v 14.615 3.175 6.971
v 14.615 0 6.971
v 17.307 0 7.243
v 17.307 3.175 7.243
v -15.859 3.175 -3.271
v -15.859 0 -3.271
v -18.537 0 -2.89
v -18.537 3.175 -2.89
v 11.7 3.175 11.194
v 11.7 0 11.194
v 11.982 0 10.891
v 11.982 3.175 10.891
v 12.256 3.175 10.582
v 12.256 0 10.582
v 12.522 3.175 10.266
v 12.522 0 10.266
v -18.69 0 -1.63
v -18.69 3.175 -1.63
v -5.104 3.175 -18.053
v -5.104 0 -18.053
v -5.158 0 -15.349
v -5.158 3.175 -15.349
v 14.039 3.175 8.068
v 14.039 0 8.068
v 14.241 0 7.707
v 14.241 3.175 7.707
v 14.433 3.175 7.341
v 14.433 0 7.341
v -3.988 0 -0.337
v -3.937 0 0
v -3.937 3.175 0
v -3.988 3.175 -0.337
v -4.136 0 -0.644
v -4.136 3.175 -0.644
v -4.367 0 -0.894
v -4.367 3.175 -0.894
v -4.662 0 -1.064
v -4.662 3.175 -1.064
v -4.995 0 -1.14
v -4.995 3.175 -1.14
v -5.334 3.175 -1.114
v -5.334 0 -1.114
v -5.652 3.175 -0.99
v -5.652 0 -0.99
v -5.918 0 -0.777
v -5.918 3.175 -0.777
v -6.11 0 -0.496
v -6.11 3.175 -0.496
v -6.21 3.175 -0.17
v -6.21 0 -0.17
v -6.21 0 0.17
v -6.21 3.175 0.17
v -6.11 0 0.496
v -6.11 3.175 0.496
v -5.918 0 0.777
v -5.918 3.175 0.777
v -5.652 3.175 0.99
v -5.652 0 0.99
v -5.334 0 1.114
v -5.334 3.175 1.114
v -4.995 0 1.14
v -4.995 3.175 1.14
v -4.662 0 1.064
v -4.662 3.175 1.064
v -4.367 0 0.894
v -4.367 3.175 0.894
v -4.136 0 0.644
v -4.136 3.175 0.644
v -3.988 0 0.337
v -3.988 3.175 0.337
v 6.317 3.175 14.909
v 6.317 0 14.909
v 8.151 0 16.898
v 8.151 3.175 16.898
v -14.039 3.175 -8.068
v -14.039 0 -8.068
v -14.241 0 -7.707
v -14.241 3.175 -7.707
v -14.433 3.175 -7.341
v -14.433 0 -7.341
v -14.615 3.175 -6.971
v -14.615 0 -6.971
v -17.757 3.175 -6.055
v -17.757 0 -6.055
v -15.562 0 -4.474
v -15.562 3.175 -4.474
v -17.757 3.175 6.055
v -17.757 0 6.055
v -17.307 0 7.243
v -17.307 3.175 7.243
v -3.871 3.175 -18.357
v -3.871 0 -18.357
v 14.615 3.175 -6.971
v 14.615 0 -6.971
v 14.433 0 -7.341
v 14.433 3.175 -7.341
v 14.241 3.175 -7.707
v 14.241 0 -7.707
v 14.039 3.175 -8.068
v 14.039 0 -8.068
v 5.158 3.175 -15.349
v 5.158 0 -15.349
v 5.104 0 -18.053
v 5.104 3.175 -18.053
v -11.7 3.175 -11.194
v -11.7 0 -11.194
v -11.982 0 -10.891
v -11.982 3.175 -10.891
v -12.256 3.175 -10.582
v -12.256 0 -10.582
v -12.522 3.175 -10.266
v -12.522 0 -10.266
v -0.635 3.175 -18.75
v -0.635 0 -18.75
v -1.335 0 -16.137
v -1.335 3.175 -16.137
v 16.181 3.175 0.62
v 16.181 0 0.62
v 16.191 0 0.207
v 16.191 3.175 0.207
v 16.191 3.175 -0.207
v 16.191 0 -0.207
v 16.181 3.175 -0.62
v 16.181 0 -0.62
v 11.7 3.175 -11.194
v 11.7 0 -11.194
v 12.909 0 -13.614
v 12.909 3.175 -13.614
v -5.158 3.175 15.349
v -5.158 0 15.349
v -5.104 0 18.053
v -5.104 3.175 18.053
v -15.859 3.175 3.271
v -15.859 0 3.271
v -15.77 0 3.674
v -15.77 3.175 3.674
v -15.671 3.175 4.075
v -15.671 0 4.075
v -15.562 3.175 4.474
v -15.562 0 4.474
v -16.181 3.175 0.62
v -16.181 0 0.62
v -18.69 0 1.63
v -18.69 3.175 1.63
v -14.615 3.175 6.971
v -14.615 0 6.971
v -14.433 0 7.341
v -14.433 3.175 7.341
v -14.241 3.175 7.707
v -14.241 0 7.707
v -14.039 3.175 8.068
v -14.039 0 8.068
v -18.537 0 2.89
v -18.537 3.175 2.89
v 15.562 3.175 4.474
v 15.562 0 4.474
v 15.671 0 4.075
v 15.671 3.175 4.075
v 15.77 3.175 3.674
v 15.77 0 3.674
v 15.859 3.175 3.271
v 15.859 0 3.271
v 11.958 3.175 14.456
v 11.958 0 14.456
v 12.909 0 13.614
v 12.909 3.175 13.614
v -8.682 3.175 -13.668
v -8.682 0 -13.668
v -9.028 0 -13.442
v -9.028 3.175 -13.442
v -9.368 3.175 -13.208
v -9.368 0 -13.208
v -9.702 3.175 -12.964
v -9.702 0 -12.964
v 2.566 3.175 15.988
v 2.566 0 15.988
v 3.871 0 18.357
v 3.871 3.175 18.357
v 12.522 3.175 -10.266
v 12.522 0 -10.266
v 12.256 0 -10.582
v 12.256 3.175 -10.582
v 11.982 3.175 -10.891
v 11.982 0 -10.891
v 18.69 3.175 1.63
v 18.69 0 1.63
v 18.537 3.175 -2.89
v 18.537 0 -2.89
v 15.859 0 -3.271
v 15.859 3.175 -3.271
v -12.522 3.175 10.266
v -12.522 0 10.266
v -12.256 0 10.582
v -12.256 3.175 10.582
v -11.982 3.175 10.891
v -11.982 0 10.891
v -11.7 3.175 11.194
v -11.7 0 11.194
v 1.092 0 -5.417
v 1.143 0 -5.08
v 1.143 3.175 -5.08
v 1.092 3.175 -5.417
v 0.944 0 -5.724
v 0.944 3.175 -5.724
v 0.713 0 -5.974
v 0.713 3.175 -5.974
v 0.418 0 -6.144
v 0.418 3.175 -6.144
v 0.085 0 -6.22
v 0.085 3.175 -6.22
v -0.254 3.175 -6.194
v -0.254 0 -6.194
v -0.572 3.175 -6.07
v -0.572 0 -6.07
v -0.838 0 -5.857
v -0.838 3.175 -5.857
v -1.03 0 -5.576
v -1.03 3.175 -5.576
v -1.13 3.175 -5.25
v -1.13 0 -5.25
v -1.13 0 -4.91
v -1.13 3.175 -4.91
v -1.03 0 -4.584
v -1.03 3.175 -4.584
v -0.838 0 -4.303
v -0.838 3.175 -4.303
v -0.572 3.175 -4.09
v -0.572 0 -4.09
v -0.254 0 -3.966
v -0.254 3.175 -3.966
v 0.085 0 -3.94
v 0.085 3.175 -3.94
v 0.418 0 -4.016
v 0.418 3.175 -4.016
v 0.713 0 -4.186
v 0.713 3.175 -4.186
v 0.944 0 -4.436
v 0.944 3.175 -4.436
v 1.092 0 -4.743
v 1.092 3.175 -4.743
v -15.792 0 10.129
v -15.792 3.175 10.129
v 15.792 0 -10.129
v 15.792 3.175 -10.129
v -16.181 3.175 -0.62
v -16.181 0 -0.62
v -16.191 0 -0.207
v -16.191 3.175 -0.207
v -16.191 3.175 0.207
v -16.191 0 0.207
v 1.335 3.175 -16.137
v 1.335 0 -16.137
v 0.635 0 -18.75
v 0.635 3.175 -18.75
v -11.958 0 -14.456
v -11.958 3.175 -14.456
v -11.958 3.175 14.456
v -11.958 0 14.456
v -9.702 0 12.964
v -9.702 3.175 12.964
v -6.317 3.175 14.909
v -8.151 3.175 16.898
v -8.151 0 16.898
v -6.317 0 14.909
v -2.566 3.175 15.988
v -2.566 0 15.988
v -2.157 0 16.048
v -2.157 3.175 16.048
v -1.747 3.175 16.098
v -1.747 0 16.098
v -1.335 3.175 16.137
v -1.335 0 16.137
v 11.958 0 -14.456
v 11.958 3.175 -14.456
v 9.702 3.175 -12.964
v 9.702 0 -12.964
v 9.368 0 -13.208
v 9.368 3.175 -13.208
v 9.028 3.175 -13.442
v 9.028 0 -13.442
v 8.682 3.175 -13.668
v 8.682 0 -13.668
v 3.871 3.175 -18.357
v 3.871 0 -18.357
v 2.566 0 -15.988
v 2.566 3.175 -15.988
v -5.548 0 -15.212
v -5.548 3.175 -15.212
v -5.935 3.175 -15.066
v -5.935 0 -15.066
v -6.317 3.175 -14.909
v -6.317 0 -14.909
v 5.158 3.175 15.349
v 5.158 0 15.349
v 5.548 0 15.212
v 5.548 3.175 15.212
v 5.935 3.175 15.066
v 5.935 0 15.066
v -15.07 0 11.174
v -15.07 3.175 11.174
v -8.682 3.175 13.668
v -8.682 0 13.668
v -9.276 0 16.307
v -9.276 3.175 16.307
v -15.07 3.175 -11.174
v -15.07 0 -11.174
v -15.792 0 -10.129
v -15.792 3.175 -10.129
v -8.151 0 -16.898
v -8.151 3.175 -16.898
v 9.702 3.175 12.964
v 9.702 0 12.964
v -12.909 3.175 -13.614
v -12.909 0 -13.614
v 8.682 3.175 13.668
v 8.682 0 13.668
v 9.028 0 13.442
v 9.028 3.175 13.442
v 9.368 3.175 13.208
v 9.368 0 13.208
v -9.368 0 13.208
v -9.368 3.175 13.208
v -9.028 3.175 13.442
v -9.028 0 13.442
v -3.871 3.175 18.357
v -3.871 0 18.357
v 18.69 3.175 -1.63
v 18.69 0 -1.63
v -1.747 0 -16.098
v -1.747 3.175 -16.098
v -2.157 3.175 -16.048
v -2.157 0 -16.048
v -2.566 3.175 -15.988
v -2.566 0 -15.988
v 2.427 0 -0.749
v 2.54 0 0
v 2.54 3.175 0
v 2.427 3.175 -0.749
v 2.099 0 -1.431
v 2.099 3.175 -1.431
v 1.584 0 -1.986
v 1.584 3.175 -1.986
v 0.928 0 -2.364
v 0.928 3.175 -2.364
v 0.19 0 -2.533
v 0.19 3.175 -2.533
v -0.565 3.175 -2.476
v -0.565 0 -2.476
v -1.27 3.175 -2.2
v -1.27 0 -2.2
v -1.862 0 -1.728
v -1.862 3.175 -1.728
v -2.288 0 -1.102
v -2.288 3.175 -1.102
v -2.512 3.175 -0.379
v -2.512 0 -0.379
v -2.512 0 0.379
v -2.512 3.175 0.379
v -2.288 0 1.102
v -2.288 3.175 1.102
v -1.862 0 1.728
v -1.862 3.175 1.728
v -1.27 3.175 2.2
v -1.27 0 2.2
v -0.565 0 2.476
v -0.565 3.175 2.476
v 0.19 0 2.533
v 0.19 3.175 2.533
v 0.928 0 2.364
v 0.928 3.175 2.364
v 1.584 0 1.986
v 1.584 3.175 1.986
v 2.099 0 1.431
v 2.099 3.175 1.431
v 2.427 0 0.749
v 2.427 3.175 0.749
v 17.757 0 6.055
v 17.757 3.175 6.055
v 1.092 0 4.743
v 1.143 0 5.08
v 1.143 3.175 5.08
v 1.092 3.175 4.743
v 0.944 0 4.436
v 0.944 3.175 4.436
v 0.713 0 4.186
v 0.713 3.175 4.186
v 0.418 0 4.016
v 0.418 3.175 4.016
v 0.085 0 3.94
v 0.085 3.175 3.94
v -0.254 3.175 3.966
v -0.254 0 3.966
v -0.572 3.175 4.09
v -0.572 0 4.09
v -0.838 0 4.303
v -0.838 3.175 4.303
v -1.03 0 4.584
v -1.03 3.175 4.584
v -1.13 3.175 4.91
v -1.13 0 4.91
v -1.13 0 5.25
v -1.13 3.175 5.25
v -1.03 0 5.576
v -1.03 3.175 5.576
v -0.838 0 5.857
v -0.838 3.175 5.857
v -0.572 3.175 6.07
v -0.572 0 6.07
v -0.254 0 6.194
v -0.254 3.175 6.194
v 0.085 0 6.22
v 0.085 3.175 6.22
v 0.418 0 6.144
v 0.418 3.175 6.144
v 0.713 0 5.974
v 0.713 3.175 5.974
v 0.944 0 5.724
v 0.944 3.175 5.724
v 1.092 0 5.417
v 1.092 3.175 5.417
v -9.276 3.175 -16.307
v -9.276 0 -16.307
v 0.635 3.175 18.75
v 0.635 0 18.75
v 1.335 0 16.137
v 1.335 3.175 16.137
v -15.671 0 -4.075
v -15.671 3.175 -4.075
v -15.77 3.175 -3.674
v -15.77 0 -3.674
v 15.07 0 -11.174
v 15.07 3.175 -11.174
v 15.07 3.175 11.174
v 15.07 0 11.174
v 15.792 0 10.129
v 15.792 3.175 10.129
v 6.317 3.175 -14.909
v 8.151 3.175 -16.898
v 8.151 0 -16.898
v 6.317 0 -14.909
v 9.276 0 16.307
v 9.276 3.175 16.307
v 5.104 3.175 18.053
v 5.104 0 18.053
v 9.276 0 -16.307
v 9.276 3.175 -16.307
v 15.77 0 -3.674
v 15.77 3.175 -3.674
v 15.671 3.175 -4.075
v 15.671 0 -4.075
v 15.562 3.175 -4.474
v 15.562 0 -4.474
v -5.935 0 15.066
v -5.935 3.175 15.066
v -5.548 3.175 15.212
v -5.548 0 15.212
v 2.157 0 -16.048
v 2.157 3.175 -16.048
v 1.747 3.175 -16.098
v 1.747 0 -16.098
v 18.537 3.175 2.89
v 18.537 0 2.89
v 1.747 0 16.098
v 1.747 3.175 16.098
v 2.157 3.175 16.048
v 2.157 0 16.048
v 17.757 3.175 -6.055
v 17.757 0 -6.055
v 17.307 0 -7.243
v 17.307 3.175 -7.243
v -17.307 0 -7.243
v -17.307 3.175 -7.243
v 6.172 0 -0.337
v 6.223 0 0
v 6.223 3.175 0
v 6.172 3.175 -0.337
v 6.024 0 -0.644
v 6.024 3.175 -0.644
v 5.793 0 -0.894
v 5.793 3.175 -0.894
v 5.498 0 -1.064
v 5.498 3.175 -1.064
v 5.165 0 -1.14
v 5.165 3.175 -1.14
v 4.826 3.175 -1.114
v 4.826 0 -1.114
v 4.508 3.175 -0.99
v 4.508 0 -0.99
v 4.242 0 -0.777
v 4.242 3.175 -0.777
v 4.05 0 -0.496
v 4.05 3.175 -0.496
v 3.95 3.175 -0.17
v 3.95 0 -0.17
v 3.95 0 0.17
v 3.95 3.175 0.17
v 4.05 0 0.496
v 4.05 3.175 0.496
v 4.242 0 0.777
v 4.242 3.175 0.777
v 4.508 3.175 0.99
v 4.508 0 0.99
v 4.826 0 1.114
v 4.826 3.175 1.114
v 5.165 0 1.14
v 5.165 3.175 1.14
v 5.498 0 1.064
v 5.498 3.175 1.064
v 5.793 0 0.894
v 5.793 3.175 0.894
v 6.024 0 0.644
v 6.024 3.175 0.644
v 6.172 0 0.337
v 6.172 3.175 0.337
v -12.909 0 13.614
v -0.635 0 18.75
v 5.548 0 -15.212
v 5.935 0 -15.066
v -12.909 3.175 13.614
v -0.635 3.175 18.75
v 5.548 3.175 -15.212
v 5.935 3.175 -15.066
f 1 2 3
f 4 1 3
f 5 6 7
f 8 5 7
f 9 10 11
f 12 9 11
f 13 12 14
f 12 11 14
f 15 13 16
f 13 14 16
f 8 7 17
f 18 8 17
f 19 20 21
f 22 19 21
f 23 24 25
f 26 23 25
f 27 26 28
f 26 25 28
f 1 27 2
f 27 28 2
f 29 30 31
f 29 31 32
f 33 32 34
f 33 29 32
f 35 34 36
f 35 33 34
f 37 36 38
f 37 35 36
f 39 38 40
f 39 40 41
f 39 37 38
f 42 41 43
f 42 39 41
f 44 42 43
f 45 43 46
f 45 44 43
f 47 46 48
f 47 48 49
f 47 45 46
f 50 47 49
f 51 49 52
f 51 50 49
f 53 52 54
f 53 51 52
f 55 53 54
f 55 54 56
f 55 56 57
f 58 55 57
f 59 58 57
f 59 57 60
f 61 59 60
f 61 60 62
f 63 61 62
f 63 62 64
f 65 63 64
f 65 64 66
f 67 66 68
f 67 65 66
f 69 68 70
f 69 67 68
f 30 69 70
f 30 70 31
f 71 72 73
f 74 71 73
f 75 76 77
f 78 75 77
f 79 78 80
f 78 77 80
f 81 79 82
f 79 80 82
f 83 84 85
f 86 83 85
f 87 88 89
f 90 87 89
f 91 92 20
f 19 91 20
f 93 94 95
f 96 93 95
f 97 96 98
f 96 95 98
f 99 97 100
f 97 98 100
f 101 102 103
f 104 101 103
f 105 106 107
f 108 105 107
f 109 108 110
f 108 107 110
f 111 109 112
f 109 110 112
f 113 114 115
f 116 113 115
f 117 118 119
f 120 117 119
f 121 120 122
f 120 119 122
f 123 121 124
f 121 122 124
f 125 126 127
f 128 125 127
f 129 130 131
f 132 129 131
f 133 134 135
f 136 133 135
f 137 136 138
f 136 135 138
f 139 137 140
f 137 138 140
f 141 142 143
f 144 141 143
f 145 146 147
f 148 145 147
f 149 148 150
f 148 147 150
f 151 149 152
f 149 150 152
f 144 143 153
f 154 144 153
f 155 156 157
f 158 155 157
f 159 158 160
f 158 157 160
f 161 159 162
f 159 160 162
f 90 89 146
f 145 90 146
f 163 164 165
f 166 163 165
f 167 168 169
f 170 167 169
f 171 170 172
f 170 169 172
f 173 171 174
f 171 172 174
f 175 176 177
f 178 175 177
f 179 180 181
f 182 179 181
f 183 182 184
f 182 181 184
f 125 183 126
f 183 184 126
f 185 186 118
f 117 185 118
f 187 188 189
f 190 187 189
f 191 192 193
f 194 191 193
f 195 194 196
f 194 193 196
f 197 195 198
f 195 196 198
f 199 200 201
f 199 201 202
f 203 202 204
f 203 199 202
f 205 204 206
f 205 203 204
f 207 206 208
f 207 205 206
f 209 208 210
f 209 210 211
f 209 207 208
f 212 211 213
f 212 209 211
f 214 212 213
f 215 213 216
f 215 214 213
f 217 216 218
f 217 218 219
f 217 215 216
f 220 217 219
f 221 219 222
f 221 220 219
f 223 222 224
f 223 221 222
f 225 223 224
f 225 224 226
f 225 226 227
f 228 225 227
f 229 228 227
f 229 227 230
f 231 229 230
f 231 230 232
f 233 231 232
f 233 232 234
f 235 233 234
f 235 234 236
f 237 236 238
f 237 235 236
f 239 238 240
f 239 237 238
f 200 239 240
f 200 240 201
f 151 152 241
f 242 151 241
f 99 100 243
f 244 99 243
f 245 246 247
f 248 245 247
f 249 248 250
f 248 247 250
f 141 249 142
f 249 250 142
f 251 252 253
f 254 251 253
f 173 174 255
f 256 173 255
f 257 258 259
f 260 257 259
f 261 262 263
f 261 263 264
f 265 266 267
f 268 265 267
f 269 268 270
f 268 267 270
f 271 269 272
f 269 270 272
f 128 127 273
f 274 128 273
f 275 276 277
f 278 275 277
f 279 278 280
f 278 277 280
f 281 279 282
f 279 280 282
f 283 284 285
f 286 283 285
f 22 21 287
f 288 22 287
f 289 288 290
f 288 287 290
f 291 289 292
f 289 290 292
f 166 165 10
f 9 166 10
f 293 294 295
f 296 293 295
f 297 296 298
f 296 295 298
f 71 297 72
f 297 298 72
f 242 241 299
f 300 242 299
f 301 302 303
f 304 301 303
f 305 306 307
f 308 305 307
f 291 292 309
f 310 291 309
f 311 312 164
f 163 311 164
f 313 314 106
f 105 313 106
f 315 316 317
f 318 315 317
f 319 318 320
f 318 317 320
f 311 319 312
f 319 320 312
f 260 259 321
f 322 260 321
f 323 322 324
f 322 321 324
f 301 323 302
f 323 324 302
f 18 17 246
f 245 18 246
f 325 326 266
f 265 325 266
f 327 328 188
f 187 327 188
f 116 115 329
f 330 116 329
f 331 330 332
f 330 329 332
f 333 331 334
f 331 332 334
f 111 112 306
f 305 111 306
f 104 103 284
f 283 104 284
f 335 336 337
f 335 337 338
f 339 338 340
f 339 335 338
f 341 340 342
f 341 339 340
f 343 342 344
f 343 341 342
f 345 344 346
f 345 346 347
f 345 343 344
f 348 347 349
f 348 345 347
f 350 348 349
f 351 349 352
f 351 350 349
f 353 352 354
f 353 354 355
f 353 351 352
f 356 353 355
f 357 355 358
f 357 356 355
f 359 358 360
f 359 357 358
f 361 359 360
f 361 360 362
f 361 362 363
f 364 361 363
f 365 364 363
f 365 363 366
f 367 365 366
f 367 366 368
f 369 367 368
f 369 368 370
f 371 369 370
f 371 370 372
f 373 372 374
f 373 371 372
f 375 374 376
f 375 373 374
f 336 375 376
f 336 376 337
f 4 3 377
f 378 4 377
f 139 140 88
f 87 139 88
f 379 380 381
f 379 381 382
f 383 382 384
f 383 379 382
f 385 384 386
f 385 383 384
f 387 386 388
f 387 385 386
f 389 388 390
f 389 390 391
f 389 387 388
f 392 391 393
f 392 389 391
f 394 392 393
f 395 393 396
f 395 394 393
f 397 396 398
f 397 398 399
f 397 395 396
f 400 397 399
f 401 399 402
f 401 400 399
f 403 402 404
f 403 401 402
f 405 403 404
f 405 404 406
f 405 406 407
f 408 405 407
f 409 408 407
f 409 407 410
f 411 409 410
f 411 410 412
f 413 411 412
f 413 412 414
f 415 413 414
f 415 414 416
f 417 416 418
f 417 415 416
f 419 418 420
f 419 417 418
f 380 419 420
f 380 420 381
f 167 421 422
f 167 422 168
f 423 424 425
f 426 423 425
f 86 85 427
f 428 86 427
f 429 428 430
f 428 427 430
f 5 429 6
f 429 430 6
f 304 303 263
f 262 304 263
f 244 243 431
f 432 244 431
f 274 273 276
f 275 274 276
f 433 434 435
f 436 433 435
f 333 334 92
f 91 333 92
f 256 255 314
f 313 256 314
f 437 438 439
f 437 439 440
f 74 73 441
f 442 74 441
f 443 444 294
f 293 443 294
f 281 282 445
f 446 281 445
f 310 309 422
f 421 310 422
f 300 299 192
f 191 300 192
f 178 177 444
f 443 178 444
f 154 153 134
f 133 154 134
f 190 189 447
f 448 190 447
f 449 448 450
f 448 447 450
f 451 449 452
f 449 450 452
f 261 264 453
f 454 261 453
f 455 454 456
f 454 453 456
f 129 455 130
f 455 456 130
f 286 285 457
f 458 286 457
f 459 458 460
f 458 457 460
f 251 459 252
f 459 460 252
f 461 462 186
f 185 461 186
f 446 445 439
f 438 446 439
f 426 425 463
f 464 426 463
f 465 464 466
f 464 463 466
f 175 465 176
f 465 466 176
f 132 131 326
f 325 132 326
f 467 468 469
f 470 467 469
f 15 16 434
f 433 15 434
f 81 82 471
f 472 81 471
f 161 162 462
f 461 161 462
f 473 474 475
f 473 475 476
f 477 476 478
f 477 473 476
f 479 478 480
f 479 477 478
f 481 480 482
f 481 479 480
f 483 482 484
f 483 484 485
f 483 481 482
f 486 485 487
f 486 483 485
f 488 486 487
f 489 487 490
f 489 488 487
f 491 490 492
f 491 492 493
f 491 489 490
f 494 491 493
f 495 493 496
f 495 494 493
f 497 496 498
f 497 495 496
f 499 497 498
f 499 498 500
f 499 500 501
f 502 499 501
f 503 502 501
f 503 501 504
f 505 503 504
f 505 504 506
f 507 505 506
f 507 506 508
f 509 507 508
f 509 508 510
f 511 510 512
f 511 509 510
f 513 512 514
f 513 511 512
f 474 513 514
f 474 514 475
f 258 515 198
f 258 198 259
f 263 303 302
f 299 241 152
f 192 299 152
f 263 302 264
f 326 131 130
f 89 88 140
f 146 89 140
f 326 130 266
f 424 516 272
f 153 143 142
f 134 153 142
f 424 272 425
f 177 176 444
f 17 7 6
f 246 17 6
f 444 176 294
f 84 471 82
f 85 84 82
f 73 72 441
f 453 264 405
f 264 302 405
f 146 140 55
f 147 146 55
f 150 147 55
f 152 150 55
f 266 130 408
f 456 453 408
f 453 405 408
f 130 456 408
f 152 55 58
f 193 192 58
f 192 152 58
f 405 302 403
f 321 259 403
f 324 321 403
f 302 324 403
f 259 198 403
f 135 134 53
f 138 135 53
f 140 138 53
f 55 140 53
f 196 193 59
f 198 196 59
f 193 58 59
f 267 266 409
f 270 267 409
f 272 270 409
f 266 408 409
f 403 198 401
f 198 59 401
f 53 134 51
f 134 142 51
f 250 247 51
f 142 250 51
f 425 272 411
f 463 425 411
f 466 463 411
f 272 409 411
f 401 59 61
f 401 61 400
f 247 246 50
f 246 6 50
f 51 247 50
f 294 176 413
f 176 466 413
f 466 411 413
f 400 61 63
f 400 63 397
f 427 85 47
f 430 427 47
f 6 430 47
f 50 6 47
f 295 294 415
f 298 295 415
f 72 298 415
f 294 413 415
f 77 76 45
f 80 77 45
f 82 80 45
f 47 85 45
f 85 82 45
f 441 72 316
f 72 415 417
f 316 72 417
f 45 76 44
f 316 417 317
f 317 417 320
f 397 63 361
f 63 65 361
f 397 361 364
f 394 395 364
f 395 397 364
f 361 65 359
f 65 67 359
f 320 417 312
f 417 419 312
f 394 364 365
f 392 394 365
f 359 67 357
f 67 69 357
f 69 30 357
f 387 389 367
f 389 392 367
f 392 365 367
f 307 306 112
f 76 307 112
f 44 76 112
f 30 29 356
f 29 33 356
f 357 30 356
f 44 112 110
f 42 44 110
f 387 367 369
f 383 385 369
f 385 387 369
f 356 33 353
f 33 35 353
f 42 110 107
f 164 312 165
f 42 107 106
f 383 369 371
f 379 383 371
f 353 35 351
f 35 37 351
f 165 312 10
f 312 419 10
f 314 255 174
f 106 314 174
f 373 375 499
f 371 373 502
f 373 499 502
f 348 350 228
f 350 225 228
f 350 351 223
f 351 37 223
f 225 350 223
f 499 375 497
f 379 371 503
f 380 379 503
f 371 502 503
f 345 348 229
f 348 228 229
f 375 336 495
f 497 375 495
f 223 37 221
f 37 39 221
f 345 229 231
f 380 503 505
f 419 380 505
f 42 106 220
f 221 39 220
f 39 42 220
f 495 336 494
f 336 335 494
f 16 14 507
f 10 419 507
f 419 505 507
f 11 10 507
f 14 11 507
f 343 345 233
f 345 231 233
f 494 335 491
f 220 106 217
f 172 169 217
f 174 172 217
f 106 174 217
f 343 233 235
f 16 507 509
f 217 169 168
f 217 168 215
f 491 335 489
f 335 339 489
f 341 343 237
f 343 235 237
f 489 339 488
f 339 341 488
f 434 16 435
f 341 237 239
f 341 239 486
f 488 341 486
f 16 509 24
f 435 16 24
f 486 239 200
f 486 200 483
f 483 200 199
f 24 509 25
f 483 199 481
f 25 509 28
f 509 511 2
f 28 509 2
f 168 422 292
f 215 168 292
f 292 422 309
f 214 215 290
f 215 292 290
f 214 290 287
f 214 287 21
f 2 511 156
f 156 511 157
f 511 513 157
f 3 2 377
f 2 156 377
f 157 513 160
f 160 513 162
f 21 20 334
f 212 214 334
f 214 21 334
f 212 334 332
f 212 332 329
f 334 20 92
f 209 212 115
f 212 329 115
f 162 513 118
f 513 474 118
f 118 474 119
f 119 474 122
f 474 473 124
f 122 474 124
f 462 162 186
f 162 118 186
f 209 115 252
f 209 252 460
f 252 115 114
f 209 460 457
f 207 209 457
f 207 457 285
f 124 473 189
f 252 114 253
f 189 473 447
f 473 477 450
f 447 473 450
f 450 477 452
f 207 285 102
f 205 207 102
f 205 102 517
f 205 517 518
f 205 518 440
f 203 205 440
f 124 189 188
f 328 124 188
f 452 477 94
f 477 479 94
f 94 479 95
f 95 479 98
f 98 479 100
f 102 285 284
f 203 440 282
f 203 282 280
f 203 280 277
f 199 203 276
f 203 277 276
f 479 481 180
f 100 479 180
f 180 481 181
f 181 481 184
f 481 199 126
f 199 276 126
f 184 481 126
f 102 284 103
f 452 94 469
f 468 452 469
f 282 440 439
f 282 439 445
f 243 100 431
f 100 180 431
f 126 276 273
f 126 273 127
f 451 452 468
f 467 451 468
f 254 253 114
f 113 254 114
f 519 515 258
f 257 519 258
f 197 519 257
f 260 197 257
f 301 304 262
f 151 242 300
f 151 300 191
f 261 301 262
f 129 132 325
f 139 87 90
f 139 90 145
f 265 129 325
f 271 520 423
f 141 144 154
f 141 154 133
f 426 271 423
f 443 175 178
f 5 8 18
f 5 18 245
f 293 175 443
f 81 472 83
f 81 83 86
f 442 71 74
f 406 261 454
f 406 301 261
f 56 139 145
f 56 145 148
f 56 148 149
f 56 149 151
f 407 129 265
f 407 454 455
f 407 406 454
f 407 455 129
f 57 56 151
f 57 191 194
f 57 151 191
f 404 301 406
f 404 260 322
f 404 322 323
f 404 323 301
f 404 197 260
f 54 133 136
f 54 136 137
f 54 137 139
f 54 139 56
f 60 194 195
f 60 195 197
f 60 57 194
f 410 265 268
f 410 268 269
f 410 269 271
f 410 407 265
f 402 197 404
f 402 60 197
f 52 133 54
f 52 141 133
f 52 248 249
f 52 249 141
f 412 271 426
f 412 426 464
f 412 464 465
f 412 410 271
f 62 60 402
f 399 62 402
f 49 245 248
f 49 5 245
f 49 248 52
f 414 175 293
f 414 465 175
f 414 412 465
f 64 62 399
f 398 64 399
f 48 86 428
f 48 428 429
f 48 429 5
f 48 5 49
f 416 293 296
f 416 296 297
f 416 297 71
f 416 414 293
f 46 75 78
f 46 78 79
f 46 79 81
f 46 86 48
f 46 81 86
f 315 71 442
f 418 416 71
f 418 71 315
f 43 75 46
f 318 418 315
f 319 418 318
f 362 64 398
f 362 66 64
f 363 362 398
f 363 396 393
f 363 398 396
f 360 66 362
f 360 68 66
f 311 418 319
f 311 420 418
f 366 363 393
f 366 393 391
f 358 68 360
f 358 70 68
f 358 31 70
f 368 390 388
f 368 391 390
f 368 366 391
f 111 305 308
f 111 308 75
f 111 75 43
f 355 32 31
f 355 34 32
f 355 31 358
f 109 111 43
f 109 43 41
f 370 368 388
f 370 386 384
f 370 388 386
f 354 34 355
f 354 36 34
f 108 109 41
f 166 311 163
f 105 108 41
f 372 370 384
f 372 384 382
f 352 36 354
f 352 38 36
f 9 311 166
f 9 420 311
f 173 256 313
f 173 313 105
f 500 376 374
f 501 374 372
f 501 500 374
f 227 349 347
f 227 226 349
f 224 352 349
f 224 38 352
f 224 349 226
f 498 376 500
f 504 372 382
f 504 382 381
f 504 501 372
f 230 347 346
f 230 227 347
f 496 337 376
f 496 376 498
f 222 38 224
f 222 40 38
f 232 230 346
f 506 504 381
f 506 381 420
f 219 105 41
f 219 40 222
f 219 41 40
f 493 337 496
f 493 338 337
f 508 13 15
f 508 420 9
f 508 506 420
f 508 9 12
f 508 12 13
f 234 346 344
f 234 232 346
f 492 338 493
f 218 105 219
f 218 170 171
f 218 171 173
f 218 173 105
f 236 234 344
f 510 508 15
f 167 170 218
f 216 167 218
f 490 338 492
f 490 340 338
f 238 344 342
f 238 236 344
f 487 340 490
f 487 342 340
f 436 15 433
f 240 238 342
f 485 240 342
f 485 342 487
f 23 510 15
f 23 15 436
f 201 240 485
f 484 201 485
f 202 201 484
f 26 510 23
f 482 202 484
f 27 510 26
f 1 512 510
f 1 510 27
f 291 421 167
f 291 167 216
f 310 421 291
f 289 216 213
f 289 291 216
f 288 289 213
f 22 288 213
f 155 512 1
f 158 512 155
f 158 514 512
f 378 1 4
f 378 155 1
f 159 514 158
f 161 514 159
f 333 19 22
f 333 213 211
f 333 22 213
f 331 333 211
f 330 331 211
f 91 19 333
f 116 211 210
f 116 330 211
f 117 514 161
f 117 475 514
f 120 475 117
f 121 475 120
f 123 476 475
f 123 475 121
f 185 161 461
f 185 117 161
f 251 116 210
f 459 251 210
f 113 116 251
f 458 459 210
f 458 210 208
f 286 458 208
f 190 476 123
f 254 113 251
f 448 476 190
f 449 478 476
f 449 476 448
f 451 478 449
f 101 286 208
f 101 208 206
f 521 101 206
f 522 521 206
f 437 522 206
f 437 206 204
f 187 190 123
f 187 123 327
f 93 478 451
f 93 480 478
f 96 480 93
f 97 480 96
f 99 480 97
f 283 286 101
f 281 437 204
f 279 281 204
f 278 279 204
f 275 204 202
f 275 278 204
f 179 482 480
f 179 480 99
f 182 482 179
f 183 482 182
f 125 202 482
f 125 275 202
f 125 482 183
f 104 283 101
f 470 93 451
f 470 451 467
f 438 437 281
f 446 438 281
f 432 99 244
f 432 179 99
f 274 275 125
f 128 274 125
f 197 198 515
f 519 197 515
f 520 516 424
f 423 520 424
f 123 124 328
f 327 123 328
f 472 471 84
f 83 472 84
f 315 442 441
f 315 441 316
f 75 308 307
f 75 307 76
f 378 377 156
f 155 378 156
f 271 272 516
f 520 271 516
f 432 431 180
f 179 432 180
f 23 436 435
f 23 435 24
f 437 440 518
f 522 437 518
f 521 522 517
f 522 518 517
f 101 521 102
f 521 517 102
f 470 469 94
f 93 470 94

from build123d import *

# Parameters (mm, degrees)
BOSS_EXTRUDE1_DEPTH = 3.175
SKETCH2_R           = 1.143
SKETCH2_R_2         = 2.54
CUT_EXTRUDE1_DEPTH  = 3.175


with BuildPart() as part:
    # Sketch1 → Boss-Extrude1 (new body)
    with BuildSketch(Plane(origin=(0, 0, 0), x_dir=(1, 0, 0), z_dir=(0, 1, 0))):
        with BuildLine():
            Line((0.635, 18.750209072), (-0.635, 18.750209114))
            Line((-0.635, 18.750209114), (-1.33510965, 16.137364669))
            ThreePointArc((-1.33510965, 16.137364669), (-1.951790294, 16.074438432), (-2.565610552, 15.987954802))
            Line((-2.565610552, 15.987954802), (-3.870670686, 18.357327521))
            Line((-3.870670686, 18.357327521), (-5.103766804, 18.053396667))
            Line((-5.103766804, 18.053396667), (-5.158237936, 15.348929528))
            ThreePointArc((-5.158237936, 15.348929528), (-5.741939727, 15.140250474), (-6.317226596, 14.909383099))
            Line((-6.317226596, 14.909383099), (-8.15139206, 16.897584819))
            Line((-8.15139206, 16.897584819), (-9.275921232, 16.307386428))
            Line((-9.275921232, 16.307386428), (-8.681588182, 13.668470393))
            ThreePointArc((-8.681588182, 13.668470393), (-9.198388493, 13.326166192), (-9.701708393, 12.964332243))
            Line((-9.701708393, 12.964332243), (-11.958384157, 14.455815909))
            Line((-11.958384157, 14.455815909), (-12.908992835, 13.613650164))
            Line((-12.908992835, 13.613650164), (-11.70039608, 11.193649442))
            ThreePointArc((-11.70039608, 11.193649442), (-12.120260356, 10.737613569), (-12.522362162, 10.265841521))
            Line((-12.522362162, 10.265841521), (-15.070398434, 11.173927523))
            Line((-15.070398434, 11.173927523), (-15.791840697, 10.128738036))
            Line((-15.791840697, 10.128738036), (-14.039219486, 8.068294272))
            ThreePointArc((-14.039219486, 8.068294272), (-14.337746742, 7.525029875), (-14.615261759, 6.970737405))
            Line((-14.615261759, 6.970737405), (-17.306575933, 7.242651084))
            Line((-17.306575933, 7.242651084), (-17.756924178, 6.055180471))
            Line((-17.756924178, 6.055180471), (-15.562134487, 4.474039167))
            ThreePointArc((-15.562134487, 4.474039167), (-15.721975403, 3.875118797), (-15.858775467, 3.270519368))
            Line((-15.858775467, 3.270519368), (-18.536958145, 2.890458091))
            Line((-18.536958145, 2.890458091), (-18.69003977, 1.629717826))
            Line((-18.69003977, 1.629717826), (-16.180634797, 0.619769168))
            ThreePointArc((-16.180634797, 0.619769168), (-16.1925, -1e-07), (-16.180634789, -0.619769367))
            Line((-16.180634789, -0.619769367), (-18.690039729, -1.629717821))
            Line((-18.690039729, -1.629717821), (-18.536958186, -2.890458096))
            Line((-18.536958186, -2.890458096), (-15.858775427, -3.270519563))
            ThreePointArc((-15.858775427, -3.270519563), (-15.721975355, -3.875118991), (-15.562134432, -4.474039358))
            Line((-15.562134432, -4.474039358), (-17.75692414, -6.055180456))
            Line((-17.75692414, -6.055180456), (-17.306575972, -7.242651099))
            Line((-17.306575972, -7.242651099), (-14.615261673, -6.970737585))
            ThreePointArc((-14.615261673, -6.970737585), (-14.337746649, -7.525030051), (-14.039219387, -8.068294445))
            Line((-14.039219387, -8.068294445), (-15.791840663, -10.128738013))
            Line((-15.791840663, -10.128738013), (-15.070398469, -11.173927546))
            Line((-15.070398469, -11.173927546), (-12.522362036, -10.265841675))
            ThreePointArc((-12.522362036, -10.265841675), (-12.120260224, -10.737613718), (-11.700395942, -11.193649586))
            Line((-11.700395942, -11.193649586), (-12.908992808, -13.613650133))
            Line((-12.908992808, -13.613650133), (-11.958384185, -14.45581594))
            Line((-11.958384185, -14.45581594), (-9.701708233, -12.964332363))
            ThreePointArc((-9.701708233, -12.964332363), (-9.198388329, -13.326166305), (-8.681588014, -13.6684705))
            Line((-8.681588014, -13.6684705), (-9.275921213, -16.307386391))
            Line((-9.275921213, -16.307386391), (-8.15139208, -16.897584856))
            Line((-8.15139208, -16.897584856), (-6.317226413, -14.909383176))
            ThreePointArc((-6.317226413, -14.909383176), (-5.74193954, -15.140250545), (-5.158237747, -15.348929591))
            Line((-5.158237747, -15.348929591), (-5.103766794, -18.053396627))
            Line((-5.103766794, -18.053396627), (-3.870670696, -18.357327561))
            Line((-3.870670696, -18.357327561), (-2.565610355, -15.987954833))
            ThreePointArc((-2.565610355, -15.987954833), (-1.951790096, -16.074438456), (-1.335109452, -16.137364686))
            Line((-1.335109452, -16.137364686), (-0.635, -18.750209072))
            Line((-0.635, -18.750209072), (0.635, -18.750209114))
            Line((0.635, -18.750209114), (1.33510965, -16.137364669))
            ThreePointArc((1.33510965, -16.137364669), (1.951790294, -16.074438432), (2.565610552, -15.987954802))
            Line((2.565610552, -15.987954802), (3.870670686, -18.357327521))
            Line((3.870670686, -18.357327521), (5.103766804, -18.053396667))
            Line((5.103766804, -18.053396667), (5.158237936, -15.348929528))
            ThreePointArc((5.158237936, -15.348929528), (5.741939727, -15.140250474), (6.317226596, -14.909383099))
            Line((6.317226596, -14.909383099), (8.15139206, -16.897584819))
            Line((8.15139206, -16.897584819), (9.275921232, -16.307386428))
            Line((9.275921232, -16.307386428), (8.681588182, -13.668470393))
            ThreePointArc((8.681588182, -13.668470393), (9.198388493, -13.326166192), (9.701708393, -12.964332243))
            Line((9.701708393, -12.964332243), (11.958384157, -14.455815909))
            Line((11.958384157, -14.455815909), (12.908992835, -13.613650164))
            Line((12.908992835, -13.613650164), (11.70039608, -11.193649442))
            ThreePointArc((11.70039608, -11.193649442), (12.120260356, -10.737613569), (12.522362162, -10.265841521))
            Line((12.522362162, -10.265841521), (15.070398434, -11.173927523))
            Line((15.070398434, -11.173927523), (15.791840697, -10.128738036))
            Line((15.791840697, -10.128738036), (14.039219486, -8.068294272))
            ThreePointArc((14.039219486, -8.068294272), (14.337746742, -7.525029875), (14.615261759, -6.970737405))
            Line((14.615261759, -6.970737405), (17.306575933, -7.242651084))
            Line((17.306575933, -7.242651084), (17.756924178, -6.055180471))
            Line((17.756924178, -6.055180471), (15.562134487, -4.474039167))
            ThreePointArc((15.562134487, -4.474039167), (15.721975403, -3.875118797), (15.858775467, -3.270519368))
            Line((15.858775467, -3.270519368), (18.536958145, -2.890458091))
            Line((18.536958145, -2.890458091), (18.69003977, -1.629717826))
            Line((18.69003977, -1.629717826), (16.180634797, -0.619769168))
            ThreePointArc((16.180634797, -0.619769168), (16.1925, 1e-07), (16.180634789, 0.619769367))
            Line((16.180634789, 0.619769367), (18.690039729, 1.629717821))
            Line((18.690039729, 1.629717821), (18.536958186, 2.890458096))
            Line((18.536958186, 2.890458096), (15.858775427, 3.270519563))
            ThreePointArc((15.858775427, 3.270519563), (15.721975355, 3.875118991), (15.562134432, 4.474039358))
            Line((15.562134432, 4.474039358), (17.75692414, 6.055180456))
            Line((17.75692414, 6.055180456), (17.306575972, 7.242651099))
            Line((17.306575972, 7.242651099), (14.615261673, 6.970737585))
            ThreePointArc((14.615261673, 6.970737585), (14.337746649, 7.525030051), (14.039219387, 8.068294445))
            Line((14.039219387, 8.068294445), (15.791840663, 10.128738013))
            Line((15.791840663, 10.128738013), (15.070398469, 11.173927546))
            Line((15.070398469, 11.173927546), (12.522362036, 10.265841675))
            ThreePointArc((12.522362036, 10.265841675), (12.120260224, 10.737613718), (11.700395942, 11.193649586))
            Line((11.700395942, 11.193649586), (12.908992808, 13.613650133))
            Line((12.908992808, 13.613650133), (11.958384185, 14.45581594))
            Line((11.958384185, 14.45581594), (9.701708233, 12.964332363))
            ThreePointArc((9.701708233, 12.964332363), (9.198388329, 13.326166305), (8.681588014, 13.6684705))
            Line((8.681588014, 13.6684705), (9.275921213, 16.307386391))
            Line((9.275921213, 16.307386391), (8.15139208, 16.897584856))
            Line((8.15139208, 16.897584856), (6.317226413, 14.909383176))
            ThreePointArc((6.317226413, 14.909383176), (5.74193954, 15.140250545), (5.158237747, 15.348929591))
            Line((5.158237747, 15.348929591), (5.103766794, 18.053396627))
            Line((5.103766794, 18.053396627), (3.870670696, 18.357327561))
            Line((3.870670696, 18.357327561), (2.565610355, 15.987954833))
            ThreePointArc((2.565610355, 15.987954833), (1.951790096, 16.074438456), (1.335109452, 16.137364686))
            Line((1.335109452, 16.137364686), (0.635, 18.750209072))
        make_face()
    extrude(amount=BOSS_EXTRUDE1_DEPTH)

    # Sketch2 → Cut-Extrude1 (cut)
    with BuildSketch(Plane(origin=(0, 0, 0), x_dir=(1, 0, 0), z_dir=(0, 1, 0))):
        with Locations((-5.08, 0)):
            Circle(SKETCH2_R)
        with Locations((0, 5.08)):
            Circle(SKETCH2_R)
        with Locations((5.08, 0)):
            Circle(SKETCH2_R)
        with Locations((0, -5.08)):
            Circle(SKETCH2_R)
        Circle(SKETCH2_R_2)
    extrude(amount=CUT_EXTRUDE1_DEPTH, mode=Mode.SUBTRACT)


solid = part.part
